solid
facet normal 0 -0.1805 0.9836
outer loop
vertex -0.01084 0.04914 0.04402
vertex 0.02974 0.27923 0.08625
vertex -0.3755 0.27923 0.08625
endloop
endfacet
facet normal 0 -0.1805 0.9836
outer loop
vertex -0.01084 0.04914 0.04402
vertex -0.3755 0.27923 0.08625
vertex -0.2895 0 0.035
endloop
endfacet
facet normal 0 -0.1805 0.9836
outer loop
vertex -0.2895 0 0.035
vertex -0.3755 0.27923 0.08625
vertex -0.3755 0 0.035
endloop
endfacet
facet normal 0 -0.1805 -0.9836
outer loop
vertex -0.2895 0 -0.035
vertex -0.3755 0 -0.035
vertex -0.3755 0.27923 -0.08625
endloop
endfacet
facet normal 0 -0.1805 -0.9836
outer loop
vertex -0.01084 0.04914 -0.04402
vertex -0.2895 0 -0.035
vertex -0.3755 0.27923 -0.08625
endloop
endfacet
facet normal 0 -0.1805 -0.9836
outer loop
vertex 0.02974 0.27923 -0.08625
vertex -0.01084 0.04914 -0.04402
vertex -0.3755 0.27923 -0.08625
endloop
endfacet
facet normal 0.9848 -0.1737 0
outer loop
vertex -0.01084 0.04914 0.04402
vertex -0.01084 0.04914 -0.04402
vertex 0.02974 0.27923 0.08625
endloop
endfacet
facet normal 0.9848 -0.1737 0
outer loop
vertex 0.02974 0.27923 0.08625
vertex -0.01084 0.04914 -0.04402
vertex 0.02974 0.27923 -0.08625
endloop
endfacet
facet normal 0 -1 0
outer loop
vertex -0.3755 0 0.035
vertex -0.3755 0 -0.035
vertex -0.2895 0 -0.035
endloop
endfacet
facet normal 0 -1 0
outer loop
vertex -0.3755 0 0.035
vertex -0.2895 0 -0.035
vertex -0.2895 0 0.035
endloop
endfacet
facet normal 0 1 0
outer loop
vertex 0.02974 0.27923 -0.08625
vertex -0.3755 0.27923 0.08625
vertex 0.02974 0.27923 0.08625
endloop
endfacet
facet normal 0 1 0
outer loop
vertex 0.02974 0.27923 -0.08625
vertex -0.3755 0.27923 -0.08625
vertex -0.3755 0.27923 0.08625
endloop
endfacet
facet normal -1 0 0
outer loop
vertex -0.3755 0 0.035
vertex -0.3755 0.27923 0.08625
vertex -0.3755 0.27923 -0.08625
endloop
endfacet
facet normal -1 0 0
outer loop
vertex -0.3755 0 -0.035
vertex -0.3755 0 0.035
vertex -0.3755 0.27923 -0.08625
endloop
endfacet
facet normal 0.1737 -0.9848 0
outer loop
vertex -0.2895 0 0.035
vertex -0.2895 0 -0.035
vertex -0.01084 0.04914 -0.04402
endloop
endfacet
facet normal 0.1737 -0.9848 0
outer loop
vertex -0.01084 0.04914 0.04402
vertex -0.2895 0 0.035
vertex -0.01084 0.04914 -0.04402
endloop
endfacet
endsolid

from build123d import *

# Parameters (mm, degrees)
TD_SKETCH_R                   = 0.792499939
TL_FEATURE_DEPTH              = 29.999999944
TDF_STD_SKETCH_W              = 1.604999838
TDF_STD_SKETCH_H              = 1.604999838
TDF_STD_FEATURE_DEPTH         = 31.02092785
ISA_20_STD_FEATURE_DEPTH      = 31.02092785
ISA_20_STD_FEATURE_DEPTH_BACK = 31.02092785
F_10BA_STD_FEATURE_DEPTH      = 31.02092785
F_10BA_STD_FEATURE_DEPTH_BACK = 31.02092785


with BuildPart() as part:
    # TD_sketch → TL_feature (new body)
    with BuildSketch(Plane(origin=(0, 0, 0), x_dir=(1, 0, 0), z_dir=(0, 1, 0))):
        with Locations(Location((0, 0, 0), (0, 0, 270))):
            Circle(TD_SKETCH_R)
    extrude(amount=TL_FEATURE_DEPTH)

    # TDF_STD_sketch → TDF_STD_feature (cut, through all)
    with BuildSketch(Plane(origin=(0, 0, 0), x_dir=(1, 0, 0), z_dir=(0, 1, 0))):
        with Locations((-1.17799993, 0)):
            Rectangle(TDF_STD_SKETCH_W, TDF_STD_SKETCH_H)
    extrude(amount=TDF_STD_FEATURE_DEPTH, mode=Mode.SUBTRACT)

    # ISA_20_STD_sketch → ISA_20_STD_feature (cut, two sides: drawn at the far end of the back side and taken through both)
    with BuildSketch(Plane(origin=(0, 0, 0), x_dir=(0, 0, -1), z_dir=(1, 0, 0)).offset(-ISA_20_STD_FEATURE_DEPTH_BACK)):
        Polygon((-18.416115078, 100.150819523), (-5.541030384, 29.999999944), (-0.035000057, 0), (0.035000057, 0), (5.541030384, 29.999999944), (18.416115078, 100.150819523), (18.416115078, -42.494268629), (-18.416115078, -42.494268629), align=None)
    extrude(amount=ISA_20_STD_FEATURE_DEPTH + ISA_20_STD_FEATURE_DEPTH_BACK, mode=Mode.SUBTRACT)

    # 10BA_STD_sketch → 10BA_STD_feature (cut, two sides: drawn at the far end of the back side and taken through both)
    with BuildSketch(Plane.XY.offset(-F_10BA_STD_FEATURE_DEPTH_BACK)):
        Polygon((-71.42876073, 0), (-0.375500011, 0), (-0.289499929, 0), (-0.010835963, 0.049135976), (5.27030945, 29.999999944), (17.608578692, 99.973801977), (123.729747966, 5.461575957), (34.692408544, -94.51222602), align=None)
    extrude(amount=F_10BA_STD_FEATURE_DEPTH + F_10BA_STD_FEATURE_DEPTH_BACK, mode=Mode.SUBTRACT)

    # cut_feature
    split(bisect_by=Plane(origin=(0, 0.279226503, 0), x_dir=(1, 0, 0), z_dir=(0, 1, 0)), keep=Keep.BOTTOM)


solid = part.part
